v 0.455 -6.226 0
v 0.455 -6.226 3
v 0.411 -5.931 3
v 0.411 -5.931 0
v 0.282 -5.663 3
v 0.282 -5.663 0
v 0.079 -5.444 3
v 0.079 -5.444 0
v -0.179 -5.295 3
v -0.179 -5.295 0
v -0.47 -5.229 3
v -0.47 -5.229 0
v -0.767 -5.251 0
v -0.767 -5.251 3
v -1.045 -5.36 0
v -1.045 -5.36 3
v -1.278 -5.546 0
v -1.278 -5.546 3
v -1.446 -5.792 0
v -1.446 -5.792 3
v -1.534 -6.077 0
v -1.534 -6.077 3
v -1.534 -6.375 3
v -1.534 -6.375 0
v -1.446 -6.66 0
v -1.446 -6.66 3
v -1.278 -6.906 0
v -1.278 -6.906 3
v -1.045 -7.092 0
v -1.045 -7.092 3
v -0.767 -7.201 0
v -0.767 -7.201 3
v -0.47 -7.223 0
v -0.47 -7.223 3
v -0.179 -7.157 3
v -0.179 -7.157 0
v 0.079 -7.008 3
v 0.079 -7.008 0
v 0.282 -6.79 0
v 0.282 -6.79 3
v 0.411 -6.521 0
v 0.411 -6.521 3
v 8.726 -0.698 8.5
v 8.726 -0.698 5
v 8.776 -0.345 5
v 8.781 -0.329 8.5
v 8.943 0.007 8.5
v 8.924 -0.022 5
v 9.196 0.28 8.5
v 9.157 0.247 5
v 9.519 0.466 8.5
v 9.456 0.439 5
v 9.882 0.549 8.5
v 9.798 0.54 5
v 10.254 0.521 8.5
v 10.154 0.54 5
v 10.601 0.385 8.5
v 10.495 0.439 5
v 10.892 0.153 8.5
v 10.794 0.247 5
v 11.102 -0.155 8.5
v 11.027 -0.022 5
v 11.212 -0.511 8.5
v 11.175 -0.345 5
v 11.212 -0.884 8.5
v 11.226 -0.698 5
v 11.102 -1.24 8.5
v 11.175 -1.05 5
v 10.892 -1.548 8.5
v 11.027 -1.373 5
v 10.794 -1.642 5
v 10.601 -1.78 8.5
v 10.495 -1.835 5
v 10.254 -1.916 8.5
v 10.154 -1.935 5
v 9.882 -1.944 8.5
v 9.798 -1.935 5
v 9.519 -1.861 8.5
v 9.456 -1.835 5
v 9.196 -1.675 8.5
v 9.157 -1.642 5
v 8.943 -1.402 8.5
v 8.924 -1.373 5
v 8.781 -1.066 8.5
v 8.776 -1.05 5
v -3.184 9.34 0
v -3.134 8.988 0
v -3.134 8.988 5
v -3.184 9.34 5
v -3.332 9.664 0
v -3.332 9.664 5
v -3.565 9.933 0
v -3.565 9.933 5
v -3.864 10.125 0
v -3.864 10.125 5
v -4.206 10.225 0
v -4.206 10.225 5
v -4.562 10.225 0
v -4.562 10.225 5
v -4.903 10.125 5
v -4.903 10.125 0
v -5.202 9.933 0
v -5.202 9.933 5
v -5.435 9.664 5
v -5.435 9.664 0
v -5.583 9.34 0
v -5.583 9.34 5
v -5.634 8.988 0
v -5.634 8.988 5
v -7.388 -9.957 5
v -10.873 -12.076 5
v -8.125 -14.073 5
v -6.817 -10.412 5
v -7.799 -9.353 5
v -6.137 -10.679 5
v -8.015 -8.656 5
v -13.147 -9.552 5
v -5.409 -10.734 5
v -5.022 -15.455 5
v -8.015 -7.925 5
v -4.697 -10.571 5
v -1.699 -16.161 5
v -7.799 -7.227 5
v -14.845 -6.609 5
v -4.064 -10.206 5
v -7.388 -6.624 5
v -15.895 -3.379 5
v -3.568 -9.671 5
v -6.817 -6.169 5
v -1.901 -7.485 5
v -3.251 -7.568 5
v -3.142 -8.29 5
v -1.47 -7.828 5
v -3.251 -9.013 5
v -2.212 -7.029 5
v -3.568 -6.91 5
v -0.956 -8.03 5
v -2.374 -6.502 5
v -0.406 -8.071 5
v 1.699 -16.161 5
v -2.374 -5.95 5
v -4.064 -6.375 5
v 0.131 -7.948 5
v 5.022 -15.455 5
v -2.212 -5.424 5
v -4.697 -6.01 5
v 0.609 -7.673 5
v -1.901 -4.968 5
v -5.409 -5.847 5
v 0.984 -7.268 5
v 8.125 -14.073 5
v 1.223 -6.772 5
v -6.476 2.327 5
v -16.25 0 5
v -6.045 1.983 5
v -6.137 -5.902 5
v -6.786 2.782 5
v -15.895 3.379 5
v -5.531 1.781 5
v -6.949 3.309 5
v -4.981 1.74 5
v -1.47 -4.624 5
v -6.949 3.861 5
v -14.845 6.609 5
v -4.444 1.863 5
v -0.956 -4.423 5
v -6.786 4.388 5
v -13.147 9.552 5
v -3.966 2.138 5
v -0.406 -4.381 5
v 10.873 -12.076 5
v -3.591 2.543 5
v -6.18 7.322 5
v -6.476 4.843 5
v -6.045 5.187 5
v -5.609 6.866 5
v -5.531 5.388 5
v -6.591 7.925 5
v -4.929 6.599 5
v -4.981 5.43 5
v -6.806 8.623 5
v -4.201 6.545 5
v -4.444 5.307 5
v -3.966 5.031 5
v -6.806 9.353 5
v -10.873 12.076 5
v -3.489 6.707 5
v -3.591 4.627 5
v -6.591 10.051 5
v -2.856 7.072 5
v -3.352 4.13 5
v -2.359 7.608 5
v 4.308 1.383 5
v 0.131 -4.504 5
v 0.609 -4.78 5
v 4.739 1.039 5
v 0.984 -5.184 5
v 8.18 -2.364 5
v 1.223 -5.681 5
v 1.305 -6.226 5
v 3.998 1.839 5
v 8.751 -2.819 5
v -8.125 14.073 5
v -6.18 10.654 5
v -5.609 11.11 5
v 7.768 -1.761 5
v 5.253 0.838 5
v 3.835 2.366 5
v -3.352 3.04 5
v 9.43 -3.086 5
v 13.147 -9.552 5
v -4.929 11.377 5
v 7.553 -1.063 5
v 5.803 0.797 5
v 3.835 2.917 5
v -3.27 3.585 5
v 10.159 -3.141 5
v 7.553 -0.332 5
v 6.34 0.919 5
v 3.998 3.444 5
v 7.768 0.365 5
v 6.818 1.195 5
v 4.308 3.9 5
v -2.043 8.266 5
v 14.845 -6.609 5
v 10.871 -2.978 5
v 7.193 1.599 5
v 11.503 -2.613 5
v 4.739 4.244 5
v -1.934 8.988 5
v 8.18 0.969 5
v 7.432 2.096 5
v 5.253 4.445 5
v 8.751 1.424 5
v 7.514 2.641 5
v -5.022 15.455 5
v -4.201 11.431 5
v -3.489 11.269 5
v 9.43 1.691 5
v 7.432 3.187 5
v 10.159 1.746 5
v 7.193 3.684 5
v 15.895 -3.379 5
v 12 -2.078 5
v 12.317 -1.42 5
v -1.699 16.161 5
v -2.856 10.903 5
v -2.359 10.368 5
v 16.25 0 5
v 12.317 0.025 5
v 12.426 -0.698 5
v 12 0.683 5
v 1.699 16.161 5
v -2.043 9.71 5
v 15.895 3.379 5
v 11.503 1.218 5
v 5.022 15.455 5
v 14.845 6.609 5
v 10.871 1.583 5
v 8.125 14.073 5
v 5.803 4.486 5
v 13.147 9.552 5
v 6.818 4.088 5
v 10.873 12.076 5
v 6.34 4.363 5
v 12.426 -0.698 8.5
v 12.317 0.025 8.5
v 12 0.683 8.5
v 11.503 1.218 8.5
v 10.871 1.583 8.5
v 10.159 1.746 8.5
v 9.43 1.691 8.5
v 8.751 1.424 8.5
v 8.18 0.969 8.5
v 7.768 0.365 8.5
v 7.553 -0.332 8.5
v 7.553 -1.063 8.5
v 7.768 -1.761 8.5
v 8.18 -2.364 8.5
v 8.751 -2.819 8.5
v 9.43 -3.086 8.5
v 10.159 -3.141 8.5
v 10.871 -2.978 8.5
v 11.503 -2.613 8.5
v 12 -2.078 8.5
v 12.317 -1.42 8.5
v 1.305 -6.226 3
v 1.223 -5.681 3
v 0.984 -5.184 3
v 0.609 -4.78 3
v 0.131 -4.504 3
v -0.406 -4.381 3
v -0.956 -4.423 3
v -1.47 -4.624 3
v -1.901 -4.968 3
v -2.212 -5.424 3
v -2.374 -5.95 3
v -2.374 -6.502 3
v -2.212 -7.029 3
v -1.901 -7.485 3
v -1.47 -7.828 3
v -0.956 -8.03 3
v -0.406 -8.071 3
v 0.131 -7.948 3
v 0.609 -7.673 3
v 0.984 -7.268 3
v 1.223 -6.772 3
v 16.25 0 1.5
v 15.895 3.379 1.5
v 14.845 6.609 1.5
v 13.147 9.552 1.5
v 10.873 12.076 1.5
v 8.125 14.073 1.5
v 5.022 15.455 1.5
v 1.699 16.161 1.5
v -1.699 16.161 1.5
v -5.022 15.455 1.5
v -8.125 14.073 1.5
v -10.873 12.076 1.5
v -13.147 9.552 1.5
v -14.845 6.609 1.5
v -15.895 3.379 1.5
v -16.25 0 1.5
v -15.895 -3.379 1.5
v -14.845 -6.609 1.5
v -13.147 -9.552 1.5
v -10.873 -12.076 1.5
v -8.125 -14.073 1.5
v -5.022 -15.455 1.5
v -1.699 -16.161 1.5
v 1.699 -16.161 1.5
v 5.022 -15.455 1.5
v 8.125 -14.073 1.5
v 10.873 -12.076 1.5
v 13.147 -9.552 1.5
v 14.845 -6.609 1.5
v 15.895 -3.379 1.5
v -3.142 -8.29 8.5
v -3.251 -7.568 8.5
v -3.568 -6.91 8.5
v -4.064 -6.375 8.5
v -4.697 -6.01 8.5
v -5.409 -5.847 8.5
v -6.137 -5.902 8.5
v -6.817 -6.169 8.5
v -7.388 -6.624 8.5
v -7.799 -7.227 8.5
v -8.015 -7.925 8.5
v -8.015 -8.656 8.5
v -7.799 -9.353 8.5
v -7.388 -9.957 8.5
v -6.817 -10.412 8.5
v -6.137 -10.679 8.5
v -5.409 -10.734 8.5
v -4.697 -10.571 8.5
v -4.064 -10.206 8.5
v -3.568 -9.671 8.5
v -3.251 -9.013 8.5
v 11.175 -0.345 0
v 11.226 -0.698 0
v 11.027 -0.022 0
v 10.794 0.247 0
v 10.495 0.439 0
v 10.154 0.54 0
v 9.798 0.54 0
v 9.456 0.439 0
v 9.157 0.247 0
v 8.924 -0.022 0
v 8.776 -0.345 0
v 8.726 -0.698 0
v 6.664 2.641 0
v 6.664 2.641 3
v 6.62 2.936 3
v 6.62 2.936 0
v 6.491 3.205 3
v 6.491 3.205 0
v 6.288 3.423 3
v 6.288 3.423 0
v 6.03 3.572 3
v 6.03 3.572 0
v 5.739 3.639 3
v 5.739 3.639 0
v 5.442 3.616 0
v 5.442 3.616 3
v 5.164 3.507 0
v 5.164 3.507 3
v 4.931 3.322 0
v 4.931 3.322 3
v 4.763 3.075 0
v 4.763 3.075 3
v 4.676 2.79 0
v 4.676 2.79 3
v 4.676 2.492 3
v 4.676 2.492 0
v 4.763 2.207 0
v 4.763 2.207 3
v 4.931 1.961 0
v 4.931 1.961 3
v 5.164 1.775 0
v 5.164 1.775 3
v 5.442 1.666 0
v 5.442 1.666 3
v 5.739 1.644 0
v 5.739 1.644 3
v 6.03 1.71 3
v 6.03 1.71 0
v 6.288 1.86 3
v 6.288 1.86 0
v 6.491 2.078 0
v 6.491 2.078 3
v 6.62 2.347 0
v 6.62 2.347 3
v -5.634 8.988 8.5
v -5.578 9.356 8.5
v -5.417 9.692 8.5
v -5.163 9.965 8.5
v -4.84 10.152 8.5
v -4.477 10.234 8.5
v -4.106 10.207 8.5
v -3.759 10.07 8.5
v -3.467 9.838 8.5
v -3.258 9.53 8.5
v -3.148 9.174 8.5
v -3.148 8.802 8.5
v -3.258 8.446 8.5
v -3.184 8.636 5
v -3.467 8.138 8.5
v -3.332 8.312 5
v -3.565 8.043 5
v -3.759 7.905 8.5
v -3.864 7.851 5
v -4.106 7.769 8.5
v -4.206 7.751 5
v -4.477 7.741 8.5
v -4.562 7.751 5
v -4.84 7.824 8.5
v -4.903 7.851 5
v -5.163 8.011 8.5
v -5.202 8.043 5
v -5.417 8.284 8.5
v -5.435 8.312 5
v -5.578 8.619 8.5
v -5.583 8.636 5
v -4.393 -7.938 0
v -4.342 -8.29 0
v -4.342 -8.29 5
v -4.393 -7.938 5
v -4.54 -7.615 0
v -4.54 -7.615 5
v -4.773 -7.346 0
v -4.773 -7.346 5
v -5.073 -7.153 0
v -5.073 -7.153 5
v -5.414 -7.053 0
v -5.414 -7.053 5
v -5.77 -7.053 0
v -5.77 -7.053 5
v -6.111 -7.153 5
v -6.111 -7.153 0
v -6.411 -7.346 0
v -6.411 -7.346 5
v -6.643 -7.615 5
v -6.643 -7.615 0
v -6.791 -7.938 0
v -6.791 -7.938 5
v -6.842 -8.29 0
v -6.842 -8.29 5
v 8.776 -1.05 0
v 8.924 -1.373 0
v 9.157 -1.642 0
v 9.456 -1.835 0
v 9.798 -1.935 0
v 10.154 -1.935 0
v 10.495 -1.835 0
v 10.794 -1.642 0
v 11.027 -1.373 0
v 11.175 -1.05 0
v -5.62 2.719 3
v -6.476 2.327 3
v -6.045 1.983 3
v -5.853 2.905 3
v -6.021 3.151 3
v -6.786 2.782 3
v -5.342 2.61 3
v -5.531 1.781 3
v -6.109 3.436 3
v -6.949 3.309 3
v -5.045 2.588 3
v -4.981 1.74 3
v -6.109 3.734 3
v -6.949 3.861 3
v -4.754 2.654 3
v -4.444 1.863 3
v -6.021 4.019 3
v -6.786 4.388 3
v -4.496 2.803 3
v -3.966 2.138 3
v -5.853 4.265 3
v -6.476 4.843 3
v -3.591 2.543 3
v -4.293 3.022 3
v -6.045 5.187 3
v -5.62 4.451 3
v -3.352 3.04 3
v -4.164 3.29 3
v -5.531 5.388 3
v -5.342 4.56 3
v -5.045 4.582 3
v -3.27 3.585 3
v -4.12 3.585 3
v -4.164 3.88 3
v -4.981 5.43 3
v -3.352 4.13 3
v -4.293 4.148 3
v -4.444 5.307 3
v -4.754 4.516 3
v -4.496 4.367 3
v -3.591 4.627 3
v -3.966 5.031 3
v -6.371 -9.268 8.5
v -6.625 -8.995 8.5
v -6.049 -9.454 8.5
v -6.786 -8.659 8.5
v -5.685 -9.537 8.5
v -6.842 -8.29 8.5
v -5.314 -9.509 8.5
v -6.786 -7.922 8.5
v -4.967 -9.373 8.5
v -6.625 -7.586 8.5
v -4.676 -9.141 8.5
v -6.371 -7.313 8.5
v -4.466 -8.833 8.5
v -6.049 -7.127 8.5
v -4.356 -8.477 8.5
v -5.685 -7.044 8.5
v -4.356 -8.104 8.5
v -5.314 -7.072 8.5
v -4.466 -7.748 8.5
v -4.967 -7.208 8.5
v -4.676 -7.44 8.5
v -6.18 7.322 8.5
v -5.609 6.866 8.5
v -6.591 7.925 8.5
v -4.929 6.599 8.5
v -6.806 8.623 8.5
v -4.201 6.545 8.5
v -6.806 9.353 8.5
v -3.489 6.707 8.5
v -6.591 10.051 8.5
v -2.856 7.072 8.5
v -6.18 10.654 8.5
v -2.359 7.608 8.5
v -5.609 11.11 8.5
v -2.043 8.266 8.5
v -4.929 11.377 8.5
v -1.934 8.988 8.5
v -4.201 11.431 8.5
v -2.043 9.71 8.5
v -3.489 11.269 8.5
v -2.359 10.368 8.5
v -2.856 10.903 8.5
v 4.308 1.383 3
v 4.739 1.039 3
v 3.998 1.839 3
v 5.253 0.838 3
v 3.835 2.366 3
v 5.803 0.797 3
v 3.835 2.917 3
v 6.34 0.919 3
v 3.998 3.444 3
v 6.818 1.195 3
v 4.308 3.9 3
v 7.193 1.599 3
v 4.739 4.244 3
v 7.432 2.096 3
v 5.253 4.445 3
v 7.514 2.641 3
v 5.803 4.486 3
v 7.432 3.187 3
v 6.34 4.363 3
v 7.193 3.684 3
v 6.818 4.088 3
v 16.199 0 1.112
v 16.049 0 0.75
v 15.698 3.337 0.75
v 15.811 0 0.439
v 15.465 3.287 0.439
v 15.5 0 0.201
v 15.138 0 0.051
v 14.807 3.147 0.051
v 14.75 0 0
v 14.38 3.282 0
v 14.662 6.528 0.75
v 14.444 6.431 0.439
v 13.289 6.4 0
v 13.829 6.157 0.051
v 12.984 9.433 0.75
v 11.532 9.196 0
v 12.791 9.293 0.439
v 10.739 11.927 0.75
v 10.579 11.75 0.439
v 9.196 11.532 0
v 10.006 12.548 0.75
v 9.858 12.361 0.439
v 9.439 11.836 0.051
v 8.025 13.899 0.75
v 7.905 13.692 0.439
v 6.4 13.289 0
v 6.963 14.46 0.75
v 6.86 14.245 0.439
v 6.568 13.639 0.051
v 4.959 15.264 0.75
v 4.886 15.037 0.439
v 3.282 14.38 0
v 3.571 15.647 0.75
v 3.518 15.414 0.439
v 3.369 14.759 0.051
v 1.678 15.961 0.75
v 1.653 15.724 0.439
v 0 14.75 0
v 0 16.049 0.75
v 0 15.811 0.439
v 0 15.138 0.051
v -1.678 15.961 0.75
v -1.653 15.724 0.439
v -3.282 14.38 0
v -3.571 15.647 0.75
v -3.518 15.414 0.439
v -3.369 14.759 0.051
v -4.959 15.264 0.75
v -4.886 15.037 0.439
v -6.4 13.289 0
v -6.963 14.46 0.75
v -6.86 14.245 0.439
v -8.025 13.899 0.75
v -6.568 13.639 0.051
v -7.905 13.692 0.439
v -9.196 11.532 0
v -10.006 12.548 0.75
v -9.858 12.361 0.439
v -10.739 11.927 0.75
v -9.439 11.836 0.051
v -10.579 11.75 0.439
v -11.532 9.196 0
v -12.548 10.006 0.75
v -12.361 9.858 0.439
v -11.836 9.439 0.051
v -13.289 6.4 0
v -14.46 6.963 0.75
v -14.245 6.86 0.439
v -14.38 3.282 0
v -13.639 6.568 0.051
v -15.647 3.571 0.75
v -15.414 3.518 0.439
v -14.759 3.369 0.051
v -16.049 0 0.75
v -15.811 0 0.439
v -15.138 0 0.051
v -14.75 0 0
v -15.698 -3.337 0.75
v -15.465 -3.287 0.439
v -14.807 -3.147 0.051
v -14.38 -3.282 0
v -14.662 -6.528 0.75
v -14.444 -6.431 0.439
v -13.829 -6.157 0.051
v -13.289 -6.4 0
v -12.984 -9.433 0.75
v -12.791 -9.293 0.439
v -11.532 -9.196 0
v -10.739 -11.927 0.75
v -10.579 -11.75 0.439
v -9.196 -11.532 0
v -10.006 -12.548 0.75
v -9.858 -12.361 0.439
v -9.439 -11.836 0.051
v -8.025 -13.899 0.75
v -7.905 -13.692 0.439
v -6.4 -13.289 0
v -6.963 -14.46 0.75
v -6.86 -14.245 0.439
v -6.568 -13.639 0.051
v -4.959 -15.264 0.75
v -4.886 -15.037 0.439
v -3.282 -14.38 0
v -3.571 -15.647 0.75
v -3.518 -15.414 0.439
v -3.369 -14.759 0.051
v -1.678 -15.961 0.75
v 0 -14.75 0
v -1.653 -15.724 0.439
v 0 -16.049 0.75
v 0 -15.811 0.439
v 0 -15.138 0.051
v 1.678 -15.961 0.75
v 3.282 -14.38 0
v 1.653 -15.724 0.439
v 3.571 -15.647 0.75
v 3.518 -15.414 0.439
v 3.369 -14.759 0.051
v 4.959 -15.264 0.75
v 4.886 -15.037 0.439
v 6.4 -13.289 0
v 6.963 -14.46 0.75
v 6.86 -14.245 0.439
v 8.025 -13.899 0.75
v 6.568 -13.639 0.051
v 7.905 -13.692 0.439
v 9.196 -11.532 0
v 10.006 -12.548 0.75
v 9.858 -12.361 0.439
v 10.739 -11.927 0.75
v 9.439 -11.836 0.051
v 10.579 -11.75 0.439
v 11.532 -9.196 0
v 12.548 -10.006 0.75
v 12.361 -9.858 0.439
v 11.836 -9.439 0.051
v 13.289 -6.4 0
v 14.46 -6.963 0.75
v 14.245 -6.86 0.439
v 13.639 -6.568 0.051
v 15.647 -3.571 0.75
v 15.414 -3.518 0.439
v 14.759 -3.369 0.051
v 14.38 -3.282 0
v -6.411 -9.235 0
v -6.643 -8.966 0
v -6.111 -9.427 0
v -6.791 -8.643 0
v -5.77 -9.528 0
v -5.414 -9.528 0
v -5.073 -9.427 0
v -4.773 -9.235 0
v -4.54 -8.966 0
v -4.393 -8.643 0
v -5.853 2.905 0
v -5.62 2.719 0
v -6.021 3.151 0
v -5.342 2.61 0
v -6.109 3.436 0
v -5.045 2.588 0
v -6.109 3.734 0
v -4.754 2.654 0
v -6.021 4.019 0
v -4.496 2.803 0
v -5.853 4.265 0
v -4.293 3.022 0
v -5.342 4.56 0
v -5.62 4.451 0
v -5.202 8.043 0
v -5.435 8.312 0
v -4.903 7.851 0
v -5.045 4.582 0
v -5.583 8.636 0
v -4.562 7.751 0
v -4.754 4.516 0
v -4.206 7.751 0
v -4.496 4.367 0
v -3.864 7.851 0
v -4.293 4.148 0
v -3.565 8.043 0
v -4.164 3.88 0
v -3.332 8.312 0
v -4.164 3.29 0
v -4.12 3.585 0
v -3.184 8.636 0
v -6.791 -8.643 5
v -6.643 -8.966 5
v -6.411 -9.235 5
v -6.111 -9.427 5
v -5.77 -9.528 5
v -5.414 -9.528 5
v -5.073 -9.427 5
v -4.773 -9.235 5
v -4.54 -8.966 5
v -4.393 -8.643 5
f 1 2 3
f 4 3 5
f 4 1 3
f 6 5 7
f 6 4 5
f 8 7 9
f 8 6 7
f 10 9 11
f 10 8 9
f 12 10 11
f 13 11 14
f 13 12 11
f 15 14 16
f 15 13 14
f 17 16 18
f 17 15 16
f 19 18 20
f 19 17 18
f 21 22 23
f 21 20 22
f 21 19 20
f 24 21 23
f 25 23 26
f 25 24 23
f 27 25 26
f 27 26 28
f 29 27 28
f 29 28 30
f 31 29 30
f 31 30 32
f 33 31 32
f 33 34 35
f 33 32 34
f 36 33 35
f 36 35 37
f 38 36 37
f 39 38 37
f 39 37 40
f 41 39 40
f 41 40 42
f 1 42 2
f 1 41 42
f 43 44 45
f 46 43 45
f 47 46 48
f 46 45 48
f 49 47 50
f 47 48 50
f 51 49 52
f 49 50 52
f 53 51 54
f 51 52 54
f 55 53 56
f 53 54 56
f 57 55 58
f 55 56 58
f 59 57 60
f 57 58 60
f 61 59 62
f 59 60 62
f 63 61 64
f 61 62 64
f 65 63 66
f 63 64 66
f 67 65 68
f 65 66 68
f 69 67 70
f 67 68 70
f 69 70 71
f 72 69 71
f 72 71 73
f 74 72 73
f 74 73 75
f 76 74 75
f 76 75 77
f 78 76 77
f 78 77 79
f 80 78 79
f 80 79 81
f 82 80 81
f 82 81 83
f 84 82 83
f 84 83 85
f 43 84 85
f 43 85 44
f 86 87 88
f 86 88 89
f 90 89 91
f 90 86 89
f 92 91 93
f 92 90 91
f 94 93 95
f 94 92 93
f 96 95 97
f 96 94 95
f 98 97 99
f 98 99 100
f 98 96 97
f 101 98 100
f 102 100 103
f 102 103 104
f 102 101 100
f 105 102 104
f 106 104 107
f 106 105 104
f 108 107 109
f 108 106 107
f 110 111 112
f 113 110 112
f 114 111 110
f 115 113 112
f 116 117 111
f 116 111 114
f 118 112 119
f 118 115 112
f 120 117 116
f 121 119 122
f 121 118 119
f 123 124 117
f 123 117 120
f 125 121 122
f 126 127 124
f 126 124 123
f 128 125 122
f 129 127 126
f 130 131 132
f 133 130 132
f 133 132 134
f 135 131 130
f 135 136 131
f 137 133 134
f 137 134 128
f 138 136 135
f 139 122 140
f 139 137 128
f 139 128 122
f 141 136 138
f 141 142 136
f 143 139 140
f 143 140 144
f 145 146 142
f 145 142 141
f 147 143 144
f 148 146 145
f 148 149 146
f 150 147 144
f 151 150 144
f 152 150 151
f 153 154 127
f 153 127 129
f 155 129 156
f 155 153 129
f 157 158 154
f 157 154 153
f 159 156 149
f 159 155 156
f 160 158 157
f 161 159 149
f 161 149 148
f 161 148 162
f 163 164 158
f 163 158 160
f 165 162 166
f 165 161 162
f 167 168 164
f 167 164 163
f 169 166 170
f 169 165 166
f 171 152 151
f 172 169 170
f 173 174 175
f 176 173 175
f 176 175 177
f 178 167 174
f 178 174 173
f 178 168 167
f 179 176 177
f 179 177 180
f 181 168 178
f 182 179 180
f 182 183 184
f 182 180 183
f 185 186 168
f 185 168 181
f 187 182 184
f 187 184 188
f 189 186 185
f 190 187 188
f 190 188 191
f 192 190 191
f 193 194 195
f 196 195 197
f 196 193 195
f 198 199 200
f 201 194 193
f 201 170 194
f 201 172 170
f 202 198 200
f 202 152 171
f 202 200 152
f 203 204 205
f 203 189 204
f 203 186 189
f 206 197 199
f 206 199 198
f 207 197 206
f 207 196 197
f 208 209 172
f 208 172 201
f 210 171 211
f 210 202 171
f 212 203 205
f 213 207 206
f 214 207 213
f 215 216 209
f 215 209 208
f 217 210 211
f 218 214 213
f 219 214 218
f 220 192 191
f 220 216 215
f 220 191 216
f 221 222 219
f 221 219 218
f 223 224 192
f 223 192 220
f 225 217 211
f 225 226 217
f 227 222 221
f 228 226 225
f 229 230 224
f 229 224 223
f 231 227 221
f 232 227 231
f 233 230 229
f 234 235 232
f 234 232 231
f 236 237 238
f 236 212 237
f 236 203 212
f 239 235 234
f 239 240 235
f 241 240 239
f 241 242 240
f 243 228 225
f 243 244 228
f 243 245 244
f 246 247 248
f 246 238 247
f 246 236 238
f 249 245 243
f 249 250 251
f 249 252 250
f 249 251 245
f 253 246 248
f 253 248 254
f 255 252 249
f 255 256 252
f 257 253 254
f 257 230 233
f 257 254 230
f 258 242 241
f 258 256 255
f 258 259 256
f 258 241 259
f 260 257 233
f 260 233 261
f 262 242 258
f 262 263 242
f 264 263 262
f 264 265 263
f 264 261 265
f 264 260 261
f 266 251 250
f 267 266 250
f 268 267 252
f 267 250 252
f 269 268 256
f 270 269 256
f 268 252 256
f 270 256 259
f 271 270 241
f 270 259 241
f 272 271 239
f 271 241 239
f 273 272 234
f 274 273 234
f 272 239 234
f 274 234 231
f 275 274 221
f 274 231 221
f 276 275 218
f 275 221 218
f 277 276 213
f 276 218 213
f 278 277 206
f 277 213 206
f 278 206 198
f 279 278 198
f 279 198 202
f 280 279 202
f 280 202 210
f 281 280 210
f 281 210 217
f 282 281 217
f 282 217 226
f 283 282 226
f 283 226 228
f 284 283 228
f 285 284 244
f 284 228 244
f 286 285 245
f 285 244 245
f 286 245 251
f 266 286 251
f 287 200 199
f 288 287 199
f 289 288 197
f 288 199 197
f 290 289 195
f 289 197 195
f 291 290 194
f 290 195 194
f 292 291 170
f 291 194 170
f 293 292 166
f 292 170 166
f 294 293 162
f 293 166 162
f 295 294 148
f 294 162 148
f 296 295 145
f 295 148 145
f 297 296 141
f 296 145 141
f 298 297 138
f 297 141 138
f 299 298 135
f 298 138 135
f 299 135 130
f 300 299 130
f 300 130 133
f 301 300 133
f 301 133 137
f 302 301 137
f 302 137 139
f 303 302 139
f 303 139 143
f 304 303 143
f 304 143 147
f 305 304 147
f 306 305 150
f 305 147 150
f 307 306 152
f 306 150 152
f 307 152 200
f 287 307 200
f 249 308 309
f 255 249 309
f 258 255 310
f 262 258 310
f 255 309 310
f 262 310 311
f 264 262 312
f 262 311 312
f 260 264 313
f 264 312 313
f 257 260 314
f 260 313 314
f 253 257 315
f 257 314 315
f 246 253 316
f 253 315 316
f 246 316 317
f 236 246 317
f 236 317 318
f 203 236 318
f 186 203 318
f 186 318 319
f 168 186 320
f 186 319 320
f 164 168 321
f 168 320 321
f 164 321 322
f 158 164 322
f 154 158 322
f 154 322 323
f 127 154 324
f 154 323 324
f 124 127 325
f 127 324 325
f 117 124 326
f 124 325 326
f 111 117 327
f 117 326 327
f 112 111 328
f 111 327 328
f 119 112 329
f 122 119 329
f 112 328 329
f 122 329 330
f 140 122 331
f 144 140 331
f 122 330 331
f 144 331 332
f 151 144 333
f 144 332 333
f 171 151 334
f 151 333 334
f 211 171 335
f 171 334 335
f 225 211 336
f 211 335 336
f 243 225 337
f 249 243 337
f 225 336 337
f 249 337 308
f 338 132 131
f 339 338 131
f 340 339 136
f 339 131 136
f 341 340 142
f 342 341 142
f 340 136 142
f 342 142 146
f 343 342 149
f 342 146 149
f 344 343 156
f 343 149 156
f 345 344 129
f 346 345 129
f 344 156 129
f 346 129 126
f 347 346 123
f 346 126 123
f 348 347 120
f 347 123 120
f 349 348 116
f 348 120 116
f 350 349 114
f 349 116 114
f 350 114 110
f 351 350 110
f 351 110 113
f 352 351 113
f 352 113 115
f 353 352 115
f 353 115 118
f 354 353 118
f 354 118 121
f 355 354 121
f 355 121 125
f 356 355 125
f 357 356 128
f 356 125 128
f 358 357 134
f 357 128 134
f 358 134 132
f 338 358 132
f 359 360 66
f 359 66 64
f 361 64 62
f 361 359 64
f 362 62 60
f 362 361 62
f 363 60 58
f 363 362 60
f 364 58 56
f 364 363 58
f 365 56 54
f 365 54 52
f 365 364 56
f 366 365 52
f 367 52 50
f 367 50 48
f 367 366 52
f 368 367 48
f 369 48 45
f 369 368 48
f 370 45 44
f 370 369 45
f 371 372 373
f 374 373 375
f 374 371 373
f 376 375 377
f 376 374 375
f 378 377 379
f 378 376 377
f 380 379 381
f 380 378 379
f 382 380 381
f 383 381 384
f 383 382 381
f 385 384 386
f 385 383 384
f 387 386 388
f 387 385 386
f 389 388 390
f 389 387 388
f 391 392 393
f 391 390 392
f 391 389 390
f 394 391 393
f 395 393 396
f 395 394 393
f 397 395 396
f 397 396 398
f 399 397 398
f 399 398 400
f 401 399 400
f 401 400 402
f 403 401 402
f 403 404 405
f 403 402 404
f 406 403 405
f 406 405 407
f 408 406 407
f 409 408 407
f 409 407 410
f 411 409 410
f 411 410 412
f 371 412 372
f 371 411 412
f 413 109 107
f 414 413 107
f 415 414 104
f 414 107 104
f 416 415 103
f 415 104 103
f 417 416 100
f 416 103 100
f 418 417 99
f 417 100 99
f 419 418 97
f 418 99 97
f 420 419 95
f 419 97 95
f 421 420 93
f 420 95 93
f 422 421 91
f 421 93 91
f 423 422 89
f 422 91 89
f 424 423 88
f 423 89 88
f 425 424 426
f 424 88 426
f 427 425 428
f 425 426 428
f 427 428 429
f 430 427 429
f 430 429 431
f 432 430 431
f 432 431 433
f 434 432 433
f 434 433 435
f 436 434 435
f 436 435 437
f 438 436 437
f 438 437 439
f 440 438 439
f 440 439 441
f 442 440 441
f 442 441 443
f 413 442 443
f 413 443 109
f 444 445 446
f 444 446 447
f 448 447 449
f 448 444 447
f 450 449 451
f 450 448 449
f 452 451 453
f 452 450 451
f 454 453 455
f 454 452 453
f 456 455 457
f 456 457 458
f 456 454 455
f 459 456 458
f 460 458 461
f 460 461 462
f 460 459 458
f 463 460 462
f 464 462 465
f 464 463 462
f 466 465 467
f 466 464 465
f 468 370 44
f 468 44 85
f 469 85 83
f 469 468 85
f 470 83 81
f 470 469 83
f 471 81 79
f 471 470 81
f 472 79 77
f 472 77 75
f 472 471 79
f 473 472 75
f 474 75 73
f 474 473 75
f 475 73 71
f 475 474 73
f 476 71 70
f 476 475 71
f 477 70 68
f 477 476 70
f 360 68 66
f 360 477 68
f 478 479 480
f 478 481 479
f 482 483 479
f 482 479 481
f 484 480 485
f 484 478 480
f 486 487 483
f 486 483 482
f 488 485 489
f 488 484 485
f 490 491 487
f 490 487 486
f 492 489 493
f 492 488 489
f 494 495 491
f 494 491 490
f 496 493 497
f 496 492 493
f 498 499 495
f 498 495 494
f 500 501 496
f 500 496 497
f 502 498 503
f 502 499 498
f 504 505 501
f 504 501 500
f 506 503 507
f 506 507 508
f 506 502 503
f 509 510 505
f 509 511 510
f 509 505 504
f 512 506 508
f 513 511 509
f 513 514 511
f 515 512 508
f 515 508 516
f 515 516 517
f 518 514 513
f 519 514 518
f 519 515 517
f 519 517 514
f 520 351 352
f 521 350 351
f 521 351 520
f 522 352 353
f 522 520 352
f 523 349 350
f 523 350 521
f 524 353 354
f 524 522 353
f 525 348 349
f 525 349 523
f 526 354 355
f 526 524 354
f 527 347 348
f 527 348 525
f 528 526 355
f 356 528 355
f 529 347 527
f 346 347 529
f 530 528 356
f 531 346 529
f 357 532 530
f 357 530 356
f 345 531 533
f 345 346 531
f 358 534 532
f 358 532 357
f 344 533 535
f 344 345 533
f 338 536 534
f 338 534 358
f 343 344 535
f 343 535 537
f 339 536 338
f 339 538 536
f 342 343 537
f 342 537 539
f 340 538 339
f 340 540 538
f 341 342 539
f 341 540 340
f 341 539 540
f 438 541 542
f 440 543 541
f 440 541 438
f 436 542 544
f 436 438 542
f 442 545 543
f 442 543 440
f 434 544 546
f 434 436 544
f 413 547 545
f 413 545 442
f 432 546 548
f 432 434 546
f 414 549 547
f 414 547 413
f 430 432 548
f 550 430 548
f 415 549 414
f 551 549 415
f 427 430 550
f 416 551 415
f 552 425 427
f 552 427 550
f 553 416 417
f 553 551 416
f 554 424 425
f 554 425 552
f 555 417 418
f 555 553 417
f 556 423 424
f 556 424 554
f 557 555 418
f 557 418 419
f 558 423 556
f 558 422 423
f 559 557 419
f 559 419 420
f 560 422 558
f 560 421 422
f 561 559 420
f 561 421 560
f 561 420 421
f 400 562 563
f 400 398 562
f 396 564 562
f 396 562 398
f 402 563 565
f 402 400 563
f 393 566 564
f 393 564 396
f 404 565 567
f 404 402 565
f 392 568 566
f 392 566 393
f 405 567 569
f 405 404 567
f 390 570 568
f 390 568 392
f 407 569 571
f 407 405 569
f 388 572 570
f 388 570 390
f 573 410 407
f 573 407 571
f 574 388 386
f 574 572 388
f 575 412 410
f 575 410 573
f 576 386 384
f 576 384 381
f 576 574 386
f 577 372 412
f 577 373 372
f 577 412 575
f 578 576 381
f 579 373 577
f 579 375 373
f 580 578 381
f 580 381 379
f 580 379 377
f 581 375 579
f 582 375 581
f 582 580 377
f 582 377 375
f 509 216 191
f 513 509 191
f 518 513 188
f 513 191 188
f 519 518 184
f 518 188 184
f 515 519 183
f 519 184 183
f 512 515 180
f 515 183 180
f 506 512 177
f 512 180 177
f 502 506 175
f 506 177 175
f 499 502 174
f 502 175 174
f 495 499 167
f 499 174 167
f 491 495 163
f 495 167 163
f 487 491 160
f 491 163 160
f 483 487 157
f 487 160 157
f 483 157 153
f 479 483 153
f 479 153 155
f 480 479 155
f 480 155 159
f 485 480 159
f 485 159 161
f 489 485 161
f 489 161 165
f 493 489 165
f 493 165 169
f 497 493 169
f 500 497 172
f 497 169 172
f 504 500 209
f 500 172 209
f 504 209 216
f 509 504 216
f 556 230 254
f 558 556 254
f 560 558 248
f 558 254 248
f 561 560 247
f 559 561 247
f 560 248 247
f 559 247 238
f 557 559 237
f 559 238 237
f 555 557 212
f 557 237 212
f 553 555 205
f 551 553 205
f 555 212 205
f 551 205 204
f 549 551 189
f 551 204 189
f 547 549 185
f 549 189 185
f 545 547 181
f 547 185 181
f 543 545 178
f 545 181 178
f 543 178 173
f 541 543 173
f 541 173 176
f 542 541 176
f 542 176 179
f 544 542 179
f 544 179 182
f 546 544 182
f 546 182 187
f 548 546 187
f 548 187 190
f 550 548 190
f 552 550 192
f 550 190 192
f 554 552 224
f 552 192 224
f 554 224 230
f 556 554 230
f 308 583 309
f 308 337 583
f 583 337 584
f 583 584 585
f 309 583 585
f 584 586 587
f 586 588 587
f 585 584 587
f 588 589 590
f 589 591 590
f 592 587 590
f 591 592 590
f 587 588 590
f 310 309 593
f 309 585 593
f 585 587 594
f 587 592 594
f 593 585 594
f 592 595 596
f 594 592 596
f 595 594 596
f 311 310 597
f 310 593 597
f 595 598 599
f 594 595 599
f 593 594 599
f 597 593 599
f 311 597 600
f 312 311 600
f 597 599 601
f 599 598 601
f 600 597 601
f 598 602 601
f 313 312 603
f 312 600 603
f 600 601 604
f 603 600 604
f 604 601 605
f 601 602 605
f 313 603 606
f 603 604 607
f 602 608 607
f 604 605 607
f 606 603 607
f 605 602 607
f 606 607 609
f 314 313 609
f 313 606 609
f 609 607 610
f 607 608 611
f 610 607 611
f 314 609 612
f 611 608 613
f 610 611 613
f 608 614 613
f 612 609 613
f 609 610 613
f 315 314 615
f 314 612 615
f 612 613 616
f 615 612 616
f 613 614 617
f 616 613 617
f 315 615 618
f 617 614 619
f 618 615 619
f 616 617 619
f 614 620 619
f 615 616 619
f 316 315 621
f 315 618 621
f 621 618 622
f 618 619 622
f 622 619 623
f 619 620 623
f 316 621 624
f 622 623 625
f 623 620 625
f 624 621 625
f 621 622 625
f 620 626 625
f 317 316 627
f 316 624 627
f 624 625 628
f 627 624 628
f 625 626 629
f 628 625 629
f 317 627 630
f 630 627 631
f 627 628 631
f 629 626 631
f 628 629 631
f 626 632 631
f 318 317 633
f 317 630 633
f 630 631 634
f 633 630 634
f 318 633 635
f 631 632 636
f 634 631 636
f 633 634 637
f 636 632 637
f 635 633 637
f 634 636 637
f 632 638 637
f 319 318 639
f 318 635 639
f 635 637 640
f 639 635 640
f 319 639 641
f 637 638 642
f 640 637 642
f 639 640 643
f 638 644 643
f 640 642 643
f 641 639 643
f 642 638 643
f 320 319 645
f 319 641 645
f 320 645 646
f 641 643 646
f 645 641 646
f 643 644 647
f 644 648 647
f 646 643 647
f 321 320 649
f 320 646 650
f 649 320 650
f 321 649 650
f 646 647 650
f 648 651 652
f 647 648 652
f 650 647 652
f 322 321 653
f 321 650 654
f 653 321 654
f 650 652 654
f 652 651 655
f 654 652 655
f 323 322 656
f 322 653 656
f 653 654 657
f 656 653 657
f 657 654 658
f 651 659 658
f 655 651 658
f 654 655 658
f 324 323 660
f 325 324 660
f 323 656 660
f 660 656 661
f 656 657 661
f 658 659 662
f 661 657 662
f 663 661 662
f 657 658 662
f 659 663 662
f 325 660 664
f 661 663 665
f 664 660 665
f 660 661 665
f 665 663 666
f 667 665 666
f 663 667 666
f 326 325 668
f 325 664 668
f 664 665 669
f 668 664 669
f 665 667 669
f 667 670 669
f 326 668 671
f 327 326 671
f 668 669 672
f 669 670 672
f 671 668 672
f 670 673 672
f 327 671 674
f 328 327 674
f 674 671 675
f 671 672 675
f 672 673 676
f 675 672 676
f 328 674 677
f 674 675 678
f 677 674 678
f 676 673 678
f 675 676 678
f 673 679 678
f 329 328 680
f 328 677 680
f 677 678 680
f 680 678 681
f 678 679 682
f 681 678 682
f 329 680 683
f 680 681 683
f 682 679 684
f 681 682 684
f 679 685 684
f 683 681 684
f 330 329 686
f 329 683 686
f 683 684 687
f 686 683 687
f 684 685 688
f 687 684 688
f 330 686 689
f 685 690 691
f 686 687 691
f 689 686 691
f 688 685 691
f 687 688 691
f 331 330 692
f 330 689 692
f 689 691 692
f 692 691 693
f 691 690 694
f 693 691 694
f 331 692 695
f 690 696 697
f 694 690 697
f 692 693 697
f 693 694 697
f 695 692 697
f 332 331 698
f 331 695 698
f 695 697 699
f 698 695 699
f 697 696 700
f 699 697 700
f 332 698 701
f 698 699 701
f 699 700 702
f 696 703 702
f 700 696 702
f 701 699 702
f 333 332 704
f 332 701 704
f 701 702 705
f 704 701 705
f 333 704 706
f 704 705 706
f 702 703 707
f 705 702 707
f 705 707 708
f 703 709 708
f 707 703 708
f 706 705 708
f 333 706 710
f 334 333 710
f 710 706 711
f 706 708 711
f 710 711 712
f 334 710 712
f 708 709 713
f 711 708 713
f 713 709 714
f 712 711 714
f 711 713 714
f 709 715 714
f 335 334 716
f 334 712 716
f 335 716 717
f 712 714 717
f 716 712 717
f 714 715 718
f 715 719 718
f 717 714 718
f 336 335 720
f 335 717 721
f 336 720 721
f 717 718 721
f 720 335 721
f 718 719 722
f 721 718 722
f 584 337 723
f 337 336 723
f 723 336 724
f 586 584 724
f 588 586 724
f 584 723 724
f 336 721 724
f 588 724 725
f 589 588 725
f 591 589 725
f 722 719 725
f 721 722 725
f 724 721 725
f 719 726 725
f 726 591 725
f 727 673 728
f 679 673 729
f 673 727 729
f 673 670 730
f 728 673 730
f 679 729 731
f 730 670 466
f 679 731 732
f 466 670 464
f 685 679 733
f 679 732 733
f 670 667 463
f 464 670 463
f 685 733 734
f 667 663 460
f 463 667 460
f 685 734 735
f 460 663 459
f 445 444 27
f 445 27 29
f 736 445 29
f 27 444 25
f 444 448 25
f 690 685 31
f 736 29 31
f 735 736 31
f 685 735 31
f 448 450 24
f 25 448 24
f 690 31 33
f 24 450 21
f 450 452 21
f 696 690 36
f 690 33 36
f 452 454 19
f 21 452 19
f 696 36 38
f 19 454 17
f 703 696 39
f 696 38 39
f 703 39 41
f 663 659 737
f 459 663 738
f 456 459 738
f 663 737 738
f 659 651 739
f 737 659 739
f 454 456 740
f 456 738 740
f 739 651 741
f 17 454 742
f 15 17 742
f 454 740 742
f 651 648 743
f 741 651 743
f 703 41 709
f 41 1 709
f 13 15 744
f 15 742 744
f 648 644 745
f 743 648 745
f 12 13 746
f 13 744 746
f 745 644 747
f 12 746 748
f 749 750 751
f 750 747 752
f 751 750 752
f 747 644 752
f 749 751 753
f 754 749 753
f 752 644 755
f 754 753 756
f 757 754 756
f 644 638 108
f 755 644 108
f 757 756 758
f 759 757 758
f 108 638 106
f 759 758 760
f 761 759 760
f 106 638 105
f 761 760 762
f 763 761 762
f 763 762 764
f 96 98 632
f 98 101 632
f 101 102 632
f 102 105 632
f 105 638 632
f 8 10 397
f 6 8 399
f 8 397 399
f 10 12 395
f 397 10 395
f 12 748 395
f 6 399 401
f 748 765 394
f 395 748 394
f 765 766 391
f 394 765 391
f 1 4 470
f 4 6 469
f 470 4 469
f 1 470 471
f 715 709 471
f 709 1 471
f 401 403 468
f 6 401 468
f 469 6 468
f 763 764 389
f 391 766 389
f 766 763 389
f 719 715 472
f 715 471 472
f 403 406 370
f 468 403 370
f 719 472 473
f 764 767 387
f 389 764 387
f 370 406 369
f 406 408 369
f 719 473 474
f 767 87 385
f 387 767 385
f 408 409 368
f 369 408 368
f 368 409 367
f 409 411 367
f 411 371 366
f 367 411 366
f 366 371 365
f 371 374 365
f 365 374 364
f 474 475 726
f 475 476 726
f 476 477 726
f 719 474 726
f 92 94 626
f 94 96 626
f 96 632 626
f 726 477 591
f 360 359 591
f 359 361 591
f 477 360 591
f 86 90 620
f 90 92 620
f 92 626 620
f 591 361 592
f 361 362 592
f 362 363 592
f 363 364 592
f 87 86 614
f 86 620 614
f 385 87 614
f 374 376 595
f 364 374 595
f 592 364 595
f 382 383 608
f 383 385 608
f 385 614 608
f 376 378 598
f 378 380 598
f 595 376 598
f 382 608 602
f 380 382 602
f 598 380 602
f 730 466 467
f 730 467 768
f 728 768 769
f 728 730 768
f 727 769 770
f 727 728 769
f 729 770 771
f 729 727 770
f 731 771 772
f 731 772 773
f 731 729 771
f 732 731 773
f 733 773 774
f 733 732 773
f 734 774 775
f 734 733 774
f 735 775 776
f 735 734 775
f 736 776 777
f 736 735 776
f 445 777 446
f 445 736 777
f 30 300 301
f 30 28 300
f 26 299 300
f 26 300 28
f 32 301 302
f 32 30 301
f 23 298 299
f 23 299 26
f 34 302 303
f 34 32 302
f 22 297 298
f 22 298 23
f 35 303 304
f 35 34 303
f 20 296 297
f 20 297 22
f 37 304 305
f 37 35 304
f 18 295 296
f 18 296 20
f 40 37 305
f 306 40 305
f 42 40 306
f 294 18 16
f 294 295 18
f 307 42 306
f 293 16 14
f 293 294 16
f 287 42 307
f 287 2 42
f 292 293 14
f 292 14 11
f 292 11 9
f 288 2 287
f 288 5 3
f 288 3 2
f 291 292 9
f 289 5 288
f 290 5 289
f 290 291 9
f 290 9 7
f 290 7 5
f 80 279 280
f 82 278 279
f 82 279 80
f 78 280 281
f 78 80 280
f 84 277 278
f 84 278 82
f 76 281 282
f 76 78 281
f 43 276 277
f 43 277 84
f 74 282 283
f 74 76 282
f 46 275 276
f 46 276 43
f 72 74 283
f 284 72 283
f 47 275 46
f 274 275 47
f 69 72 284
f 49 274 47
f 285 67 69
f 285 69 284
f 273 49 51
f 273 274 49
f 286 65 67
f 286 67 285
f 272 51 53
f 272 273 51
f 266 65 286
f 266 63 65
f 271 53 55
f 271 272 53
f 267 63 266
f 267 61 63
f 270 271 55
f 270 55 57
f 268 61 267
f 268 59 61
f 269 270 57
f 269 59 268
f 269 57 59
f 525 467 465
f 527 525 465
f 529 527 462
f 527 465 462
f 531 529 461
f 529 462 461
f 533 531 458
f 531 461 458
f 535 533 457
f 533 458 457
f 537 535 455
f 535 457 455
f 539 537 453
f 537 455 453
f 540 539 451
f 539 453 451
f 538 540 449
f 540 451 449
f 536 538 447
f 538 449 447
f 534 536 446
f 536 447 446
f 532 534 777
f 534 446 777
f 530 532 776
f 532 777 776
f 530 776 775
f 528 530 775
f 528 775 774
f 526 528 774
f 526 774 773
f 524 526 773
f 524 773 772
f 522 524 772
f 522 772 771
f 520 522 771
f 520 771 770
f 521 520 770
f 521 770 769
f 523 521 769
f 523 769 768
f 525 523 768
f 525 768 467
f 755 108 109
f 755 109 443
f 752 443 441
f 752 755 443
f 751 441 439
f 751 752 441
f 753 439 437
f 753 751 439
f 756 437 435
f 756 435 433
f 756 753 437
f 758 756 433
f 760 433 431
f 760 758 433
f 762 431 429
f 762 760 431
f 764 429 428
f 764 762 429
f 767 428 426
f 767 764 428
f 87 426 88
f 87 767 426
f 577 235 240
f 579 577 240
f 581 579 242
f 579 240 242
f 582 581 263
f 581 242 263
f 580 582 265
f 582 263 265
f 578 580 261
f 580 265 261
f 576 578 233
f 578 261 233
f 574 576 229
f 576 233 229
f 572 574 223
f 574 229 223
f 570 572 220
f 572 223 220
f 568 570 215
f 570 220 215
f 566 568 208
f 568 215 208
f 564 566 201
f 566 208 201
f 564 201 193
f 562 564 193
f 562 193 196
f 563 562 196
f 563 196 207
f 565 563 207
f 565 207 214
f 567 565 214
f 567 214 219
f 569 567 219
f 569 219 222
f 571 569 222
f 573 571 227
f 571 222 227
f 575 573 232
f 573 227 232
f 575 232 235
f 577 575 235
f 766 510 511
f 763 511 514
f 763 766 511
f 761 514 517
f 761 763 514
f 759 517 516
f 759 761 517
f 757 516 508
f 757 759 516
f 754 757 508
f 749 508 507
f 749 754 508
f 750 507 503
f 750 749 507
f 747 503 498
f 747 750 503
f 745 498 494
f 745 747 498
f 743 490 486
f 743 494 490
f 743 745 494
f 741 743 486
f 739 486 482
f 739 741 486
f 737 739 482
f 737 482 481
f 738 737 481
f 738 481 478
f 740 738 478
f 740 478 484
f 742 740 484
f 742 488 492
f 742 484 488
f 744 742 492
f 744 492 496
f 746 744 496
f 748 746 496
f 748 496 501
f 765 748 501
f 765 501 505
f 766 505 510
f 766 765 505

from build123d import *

# Parameters (mm, degrees)
SKETCH1_R               = 16.25
SKETCH1_R_2             = 1
SKETCH1_R_3             = 1.25
BOSS_EXTRUDE1_DEPTH     = 5
FILLET1_R               = 1.5
SKETCH2_R               = 2.45
BOSS_EXTRUDE2_DEPTH     = 3.5
SKETCH4_R               = 1.25
CUT_EXTRUDE1_DEPTH      = 1
CUT_EXTRUDE1_DEPTH_BACK = 9.5
SKETCH5_R               = 1.85
CUT_EXTRUDE2_DEPTH      = 2


with BuildPart() as part:
    # Sketch1 → Boss-Extrude1 (new body)
    with BuildSketch(Plane.XY):
        Circle(SKETCH1_R)
        with Locations((-0.544723392, -6.226216863)):
            Circle(SKETCH1_R_2, mode=Mode.SUBTRACT)
        with Locations((-5.119700277, 3.584852727)):
            Circle(SKETCH1_R_2, mode=Mode.SUBTRACT)
        with Locations((5.664423669, 2.641364136)):
            Circle(SKETCH1_R_2, mode=Mode.SUBTRACT)
        with Locations((-5.591929035, -8.290375726)):
            Circle(SKETCH1_R_3, mode=Mode.SUBTRACT)
        with Locations((-4.383711468, 8.987940463)):
            Circle(SKETCH1_R_3, mode=Mode.SUBTRACT)
        with Locations((9.975640503, -0.697564737)):
            Circle(SKETCH1_R_3, mode=Mode.SUBTRACT)
    extrude(amount=BOSS_EXTRUDE1_DEPTH)

    # Fillet1
    fillet1_edges = [part.edges().sort_by_distance(p)[0] for p in [
        (-16.25, 0, 0),
    ]]
    fillet(fillet1_edges, radius=FILLET1_R)

    # Sketch2 → Boss-Extrude2 (add)
    with BuildSketch(Plane.XY.offset(5)):
        with Locations((-5.591929035, -8.290375726)):
            Circle(SKETCH2_R)
        with Locations((-4.383711468, 8.987940463)):
            Circle(SKETCH2_R)
        with Locations((9.975640503, -0.697564737)):
            Circle(SKETCH2_R)
    extrude(amount=BOSS_EXTRUDE2_DEPTH)

    # Sketch4 → Cut-Extrude1 (cut, two sides)
    with BuildSketch(Plane(origin=(0, 0, 0), x_dir=(-1, 0, 0), z_dir=(0, 0, -1))) as cut_extrude1_sk:
        with Locations((4.383711468, 8.987940463)):
            Circle(SKETCH4_R)
        with Locations((-9.975640503, -0.697564737)):
            Circle(SKETCH4_R)
        with Locations((5.591929035, -8.290375726)):
            Circle(SKETCH4_R)
    extrude(amount=CUT_EXTRUDE1_DEPTH, mode=Mode.SUBTRACT)
    extrude(cut_extrude1_sk.sketch, amount=-CUT_EXTRUDE1_DEPTH_BACK, mode=Mode.SUBTRACT)

    # Sketch5 → Cut-Extrude2 (cut)
    with BuildSketch(Plane.XY.offset(5)):
        with Locations((5.664423669, 2.641364136)):
            Circle(SKETCH5_R)
        with Locations((-5.119700277, 3.584852727)):
            Circle(SKETCH5_R)
        with Locations((-0.544723392, -6.226216863)):
            Circle(SKETCH5_R)
    extrude(amount=-CUT_EXTRUDE2_DEPTH, mode=Mode.SUBTRACT)


solid = part.part
